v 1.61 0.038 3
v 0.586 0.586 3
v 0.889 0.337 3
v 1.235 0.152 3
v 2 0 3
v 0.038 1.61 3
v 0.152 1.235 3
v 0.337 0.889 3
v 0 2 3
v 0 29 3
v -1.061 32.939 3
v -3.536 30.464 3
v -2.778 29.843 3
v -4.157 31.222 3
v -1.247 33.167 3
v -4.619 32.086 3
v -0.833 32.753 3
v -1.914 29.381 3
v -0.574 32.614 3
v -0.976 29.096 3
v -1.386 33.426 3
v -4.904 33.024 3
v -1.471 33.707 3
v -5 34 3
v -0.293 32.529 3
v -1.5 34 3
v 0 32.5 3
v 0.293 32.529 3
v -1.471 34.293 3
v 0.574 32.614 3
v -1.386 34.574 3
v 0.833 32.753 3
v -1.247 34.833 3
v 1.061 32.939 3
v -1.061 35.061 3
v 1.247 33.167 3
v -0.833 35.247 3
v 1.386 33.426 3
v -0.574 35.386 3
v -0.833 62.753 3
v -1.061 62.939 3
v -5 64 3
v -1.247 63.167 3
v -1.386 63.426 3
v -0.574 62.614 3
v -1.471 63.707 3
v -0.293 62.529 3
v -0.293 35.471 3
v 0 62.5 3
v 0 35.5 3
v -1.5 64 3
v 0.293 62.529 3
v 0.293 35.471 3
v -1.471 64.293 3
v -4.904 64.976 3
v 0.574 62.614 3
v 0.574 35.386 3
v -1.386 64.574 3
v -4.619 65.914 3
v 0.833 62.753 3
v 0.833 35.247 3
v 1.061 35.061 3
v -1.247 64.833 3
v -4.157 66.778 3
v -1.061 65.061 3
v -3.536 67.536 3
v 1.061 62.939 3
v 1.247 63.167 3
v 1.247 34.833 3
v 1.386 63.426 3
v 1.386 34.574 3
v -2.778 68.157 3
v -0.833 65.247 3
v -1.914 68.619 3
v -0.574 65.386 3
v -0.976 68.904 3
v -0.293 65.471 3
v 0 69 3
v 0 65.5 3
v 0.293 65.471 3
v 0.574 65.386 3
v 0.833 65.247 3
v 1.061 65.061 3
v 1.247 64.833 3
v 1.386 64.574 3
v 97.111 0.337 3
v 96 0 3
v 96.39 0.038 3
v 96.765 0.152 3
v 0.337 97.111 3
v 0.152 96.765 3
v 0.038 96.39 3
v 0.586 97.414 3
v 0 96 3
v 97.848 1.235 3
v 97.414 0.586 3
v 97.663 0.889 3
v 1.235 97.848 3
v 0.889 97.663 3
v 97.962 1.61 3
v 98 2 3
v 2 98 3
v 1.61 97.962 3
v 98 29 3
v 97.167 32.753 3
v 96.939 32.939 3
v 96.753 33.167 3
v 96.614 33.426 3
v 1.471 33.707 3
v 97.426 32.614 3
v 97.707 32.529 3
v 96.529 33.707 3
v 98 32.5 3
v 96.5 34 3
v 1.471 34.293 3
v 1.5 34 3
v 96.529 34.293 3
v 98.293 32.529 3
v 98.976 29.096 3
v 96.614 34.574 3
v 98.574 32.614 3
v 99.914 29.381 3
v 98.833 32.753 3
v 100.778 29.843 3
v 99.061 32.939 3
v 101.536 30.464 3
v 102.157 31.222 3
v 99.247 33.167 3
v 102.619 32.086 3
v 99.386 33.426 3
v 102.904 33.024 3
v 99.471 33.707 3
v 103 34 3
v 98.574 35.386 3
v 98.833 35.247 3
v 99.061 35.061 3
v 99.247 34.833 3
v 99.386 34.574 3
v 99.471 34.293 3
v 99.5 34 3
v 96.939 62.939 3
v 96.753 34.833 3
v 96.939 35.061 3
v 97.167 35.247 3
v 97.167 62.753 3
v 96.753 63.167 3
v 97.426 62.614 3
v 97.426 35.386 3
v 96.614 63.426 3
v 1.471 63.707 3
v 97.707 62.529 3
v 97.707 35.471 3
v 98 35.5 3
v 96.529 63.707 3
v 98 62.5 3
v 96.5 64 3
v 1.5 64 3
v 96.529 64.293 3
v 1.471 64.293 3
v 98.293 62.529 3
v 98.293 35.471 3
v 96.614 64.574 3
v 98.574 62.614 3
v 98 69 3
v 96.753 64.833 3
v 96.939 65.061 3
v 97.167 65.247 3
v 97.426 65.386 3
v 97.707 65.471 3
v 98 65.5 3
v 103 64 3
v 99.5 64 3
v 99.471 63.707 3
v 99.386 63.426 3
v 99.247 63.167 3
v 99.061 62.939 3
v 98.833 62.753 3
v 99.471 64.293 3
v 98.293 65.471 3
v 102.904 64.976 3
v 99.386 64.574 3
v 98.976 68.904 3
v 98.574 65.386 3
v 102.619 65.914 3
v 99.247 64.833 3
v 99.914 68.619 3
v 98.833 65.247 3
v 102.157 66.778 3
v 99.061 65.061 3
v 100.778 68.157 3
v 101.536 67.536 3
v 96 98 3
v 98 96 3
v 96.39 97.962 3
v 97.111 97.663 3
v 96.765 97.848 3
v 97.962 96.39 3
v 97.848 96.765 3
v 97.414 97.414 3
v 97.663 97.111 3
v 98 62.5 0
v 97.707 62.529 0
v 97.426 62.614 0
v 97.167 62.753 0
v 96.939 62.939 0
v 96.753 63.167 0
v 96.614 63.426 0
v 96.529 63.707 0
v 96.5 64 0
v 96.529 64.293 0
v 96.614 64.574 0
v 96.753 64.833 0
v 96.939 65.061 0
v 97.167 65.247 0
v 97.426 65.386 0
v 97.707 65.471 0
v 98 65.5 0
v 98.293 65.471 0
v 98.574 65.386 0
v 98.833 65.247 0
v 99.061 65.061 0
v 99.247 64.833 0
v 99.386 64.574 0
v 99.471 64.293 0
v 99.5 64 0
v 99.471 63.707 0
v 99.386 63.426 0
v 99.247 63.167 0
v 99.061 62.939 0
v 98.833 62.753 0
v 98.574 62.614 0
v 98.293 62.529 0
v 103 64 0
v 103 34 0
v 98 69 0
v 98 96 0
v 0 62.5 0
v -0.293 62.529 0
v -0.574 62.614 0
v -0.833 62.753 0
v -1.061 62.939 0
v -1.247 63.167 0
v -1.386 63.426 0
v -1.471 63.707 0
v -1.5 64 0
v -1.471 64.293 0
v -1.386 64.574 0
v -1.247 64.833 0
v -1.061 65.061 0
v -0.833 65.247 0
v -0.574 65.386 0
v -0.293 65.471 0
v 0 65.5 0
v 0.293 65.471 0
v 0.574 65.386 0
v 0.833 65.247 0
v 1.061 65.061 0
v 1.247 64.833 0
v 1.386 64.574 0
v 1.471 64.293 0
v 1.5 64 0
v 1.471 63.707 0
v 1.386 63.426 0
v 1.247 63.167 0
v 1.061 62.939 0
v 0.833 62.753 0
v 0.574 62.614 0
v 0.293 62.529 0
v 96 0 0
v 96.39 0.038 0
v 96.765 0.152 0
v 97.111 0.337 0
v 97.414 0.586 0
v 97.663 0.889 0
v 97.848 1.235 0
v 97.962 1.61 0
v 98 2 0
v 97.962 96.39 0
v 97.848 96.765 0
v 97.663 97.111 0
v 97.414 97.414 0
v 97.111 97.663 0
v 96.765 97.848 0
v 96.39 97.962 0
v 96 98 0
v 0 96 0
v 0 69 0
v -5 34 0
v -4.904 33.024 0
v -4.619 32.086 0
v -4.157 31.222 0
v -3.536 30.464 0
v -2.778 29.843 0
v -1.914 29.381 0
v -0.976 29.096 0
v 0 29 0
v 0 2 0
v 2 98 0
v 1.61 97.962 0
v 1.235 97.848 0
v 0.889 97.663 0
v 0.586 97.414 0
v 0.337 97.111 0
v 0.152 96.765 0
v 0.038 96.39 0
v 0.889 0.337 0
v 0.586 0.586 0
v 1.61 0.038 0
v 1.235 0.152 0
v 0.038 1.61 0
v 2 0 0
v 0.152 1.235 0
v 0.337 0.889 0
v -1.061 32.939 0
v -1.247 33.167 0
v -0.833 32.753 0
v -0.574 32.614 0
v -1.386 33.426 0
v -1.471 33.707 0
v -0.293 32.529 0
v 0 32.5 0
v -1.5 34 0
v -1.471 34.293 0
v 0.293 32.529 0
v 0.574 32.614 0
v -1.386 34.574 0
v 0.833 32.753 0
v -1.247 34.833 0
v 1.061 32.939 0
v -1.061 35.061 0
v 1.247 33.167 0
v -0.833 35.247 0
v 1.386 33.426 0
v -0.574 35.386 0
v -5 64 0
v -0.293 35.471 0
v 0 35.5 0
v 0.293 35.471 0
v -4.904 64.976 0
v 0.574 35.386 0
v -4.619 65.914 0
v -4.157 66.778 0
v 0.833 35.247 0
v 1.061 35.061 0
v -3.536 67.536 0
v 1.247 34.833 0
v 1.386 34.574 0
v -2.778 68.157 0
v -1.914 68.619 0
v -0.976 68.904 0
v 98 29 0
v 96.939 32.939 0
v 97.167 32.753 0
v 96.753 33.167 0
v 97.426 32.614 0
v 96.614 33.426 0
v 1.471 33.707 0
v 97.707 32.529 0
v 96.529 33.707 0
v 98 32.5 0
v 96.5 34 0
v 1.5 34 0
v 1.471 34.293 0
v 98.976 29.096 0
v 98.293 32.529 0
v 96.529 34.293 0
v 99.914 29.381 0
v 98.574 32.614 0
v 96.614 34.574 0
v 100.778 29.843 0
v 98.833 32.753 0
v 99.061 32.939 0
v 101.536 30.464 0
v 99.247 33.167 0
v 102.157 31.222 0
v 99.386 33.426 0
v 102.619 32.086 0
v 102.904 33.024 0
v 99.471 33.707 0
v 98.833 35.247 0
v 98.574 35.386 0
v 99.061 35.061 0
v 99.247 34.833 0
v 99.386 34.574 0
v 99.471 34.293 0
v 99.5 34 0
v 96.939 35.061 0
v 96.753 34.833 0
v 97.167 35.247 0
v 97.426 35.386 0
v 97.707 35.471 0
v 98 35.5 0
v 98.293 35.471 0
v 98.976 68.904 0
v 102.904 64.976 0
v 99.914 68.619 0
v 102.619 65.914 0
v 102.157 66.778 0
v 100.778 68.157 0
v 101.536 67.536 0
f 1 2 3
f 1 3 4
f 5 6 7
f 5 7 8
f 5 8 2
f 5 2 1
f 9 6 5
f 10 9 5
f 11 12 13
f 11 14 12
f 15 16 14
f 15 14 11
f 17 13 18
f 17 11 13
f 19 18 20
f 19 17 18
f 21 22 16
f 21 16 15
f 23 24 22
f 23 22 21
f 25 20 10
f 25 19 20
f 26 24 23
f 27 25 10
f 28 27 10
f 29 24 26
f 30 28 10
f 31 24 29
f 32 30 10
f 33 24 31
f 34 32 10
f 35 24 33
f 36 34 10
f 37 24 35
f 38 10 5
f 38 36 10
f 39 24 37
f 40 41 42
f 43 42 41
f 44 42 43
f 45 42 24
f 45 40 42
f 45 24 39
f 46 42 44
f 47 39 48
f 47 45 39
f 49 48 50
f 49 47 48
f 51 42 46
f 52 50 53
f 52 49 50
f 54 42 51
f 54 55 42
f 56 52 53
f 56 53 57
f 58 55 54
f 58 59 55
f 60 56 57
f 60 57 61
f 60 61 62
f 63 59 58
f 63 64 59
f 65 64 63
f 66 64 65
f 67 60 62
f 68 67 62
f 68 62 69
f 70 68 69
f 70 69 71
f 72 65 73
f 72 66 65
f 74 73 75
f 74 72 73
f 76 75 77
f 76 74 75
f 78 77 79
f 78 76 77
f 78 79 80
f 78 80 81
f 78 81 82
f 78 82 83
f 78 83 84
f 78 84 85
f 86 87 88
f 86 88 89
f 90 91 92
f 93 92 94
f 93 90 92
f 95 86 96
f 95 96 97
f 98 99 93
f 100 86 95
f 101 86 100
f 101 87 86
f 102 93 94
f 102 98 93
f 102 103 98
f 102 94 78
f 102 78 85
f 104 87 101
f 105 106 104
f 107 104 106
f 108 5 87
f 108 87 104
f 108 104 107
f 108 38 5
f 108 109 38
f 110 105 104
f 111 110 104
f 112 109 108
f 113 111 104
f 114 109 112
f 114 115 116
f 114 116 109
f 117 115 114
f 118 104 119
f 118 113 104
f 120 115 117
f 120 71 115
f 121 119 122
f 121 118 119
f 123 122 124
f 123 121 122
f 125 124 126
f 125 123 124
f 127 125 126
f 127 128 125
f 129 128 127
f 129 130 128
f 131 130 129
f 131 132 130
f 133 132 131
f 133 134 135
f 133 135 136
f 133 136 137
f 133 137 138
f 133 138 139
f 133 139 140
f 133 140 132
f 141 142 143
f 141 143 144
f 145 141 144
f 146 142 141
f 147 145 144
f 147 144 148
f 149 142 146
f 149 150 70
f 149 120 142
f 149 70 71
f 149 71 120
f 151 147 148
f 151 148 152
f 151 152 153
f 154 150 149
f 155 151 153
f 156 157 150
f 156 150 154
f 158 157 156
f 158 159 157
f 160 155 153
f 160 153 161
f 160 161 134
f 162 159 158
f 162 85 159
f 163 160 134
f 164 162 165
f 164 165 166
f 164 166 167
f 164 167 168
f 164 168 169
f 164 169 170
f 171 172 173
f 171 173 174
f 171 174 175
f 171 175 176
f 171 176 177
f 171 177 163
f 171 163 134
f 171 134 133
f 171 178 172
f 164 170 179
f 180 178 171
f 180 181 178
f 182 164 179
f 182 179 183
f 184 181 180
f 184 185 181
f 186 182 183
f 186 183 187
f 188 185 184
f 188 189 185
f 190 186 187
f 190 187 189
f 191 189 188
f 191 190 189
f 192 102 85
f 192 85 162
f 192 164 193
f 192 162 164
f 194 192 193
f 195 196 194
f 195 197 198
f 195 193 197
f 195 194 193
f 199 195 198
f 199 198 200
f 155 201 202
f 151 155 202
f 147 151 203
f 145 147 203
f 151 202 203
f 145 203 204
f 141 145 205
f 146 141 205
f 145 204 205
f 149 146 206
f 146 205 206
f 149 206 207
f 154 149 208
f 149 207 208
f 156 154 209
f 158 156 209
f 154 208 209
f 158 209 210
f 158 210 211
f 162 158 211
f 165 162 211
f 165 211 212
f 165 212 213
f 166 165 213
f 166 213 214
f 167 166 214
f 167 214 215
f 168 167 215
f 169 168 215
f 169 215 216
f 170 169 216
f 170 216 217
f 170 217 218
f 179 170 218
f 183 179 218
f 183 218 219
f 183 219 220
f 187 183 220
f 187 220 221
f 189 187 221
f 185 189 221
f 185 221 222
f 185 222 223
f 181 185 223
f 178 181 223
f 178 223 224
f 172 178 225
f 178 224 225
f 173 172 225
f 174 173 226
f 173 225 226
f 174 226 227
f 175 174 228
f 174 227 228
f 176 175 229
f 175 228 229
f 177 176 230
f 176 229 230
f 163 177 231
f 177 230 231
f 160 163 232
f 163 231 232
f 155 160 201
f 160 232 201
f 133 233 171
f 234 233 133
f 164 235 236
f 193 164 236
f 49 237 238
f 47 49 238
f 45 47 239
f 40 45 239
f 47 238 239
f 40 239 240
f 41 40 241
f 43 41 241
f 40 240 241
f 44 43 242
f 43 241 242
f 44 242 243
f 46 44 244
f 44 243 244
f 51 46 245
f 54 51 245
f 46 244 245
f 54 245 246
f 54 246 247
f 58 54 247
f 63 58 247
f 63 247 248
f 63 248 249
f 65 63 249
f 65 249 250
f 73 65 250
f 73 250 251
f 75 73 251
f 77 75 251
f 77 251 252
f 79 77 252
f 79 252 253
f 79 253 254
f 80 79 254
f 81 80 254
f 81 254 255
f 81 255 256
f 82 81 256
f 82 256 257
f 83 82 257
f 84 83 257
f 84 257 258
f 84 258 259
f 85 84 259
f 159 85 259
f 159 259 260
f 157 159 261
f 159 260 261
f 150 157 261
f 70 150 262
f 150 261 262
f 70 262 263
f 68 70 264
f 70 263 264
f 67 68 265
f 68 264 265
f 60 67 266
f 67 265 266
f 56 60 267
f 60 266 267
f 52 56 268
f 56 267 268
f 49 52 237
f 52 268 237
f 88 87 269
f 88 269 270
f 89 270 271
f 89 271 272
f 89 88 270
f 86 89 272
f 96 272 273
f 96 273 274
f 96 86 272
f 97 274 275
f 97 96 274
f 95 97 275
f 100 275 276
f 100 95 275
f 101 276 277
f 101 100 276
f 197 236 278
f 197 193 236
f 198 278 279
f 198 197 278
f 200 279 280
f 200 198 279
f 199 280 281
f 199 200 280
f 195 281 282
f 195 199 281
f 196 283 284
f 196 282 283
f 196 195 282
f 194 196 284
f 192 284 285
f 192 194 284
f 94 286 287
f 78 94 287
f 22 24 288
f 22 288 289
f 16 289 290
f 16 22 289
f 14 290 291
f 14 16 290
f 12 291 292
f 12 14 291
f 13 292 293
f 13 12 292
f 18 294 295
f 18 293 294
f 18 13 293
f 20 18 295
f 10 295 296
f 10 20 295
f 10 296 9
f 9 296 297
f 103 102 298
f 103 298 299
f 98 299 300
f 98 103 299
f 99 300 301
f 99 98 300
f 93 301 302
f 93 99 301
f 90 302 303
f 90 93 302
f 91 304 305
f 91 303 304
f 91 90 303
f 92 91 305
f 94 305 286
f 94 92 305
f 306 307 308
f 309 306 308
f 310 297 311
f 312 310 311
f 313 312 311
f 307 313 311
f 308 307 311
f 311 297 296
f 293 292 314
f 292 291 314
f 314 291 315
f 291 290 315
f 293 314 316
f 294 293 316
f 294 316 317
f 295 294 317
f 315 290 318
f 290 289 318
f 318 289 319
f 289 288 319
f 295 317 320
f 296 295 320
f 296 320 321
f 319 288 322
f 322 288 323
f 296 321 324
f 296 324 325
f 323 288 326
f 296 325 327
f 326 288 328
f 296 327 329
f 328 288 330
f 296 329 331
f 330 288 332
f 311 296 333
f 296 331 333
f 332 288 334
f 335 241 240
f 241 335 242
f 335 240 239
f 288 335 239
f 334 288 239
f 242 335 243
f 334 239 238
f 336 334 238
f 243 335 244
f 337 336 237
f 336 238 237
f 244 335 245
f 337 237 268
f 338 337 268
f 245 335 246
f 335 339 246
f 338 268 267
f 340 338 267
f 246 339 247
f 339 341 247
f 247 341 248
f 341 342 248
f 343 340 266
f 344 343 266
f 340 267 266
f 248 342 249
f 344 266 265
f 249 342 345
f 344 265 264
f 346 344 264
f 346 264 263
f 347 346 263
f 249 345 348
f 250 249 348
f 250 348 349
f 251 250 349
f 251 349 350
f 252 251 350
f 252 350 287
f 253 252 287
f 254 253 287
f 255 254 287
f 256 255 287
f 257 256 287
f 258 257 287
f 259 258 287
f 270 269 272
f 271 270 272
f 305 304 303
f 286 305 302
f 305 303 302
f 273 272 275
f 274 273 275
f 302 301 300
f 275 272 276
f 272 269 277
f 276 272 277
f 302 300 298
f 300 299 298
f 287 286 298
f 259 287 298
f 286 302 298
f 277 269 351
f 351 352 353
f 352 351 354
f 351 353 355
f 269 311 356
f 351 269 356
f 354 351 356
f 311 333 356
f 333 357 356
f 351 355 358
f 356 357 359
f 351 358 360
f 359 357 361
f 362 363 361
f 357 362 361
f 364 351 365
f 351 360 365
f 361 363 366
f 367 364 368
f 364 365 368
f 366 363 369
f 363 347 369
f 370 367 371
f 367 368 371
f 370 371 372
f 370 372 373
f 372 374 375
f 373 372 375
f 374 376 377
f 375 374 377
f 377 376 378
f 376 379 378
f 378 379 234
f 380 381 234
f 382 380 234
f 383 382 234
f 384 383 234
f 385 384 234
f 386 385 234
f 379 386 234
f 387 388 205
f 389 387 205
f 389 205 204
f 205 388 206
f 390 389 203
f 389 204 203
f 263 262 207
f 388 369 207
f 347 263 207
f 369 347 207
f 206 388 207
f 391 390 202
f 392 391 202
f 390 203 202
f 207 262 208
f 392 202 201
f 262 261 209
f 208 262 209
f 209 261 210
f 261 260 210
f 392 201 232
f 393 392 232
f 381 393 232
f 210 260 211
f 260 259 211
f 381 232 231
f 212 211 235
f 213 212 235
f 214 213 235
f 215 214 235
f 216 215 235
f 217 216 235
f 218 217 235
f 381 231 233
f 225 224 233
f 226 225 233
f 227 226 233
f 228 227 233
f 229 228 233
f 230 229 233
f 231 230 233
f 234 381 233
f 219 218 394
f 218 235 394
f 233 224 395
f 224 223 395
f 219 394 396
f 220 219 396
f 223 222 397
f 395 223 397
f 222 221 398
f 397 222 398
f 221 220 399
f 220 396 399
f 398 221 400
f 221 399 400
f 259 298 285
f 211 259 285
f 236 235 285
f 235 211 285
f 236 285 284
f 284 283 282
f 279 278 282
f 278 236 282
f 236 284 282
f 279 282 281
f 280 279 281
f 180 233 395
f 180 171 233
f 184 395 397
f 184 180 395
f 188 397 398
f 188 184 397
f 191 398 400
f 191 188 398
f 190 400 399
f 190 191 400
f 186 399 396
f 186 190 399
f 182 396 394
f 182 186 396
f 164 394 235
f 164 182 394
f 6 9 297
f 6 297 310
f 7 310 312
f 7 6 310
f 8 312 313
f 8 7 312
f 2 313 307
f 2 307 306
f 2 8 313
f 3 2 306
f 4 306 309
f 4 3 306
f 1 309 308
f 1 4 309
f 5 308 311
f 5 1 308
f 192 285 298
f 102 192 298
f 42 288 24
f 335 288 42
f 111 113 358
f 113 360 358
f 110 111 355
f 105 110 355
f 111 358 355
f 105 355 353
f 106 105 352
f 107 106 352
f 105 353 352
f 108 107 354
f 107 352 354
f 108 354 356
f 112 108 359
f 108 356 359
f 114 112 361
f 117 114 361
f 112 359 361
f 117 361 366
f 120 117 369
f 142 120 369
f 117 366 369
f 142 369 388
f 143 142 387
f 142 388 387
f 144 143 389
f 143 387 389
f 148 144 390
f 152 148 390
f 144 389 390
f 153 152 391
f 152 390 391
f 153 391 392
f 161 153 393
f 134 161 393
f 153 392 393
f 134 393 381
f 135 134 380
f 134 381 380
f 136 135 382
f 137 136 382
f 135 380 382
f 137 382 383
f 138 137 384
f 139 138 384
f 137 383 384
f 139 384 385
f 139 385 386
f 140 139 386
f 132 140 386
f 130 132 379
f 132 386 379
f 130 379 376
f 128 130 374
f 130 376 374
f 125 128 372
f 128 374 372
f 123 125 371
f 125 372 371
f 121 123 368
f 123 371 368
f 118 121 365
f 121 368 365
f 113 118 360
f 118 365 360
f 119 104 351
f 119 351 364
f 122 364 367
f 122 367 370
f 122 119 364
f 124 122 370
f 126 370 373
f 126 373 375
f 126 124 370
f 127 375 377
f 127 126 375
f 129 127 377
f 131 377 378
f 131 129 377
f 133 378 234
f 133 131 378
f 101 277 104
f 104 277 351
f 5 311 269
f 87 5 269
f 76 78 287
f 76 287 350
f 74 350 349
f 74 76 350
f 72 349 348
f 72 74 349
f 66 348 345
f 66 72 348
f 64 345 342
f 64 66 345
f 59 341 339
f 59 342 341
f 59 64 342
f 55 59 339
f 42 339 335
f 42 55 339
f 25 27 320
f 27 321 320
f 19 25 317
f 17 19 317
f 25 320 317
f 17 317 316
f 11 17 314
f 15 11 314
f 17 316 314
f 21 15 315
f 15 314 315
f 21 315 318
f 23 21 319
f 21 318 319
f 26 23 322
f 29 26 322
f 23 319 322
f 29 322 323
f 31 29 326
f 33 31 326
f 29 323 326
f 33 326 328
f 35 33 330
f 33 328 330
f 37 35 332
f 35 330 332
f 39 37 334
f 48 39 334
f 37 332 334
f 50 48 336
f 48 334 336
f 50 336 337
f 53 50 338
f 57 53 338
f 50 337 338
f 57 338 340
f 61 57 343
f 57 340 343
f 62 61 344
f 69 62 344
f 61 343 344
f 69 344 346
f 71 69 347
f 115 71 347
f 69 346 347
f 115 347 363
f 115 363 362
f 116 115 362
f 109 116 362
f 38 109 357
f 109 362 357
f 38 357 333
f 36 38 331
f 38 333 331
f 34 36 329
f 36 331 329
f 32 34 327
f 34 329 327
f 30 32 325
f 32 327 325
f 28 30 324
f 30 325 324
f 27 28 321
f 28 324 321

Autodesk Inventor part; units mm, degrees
ref_plane "YZ Plane" through (0, 0, 0) normal (1, 0, 0) x (0, 1, 0)
ref_plane "XZ Plane" through (0, 0, 0) normal (0, 1, 0) x (-1, 0, 0)
ref_plane "XY Plane" through (0, 0, 0) normal (0, 0, 1) x (1, 0, 0)
sketch "Sketch1" plane through (0, 0, 0) normal (0, 0, 1) x (1, 0, 0)
  line L0 (0, 0) -> (98, 0)
  line L1 (98, 0) -> (98, 98)
  line L2 (98, 98) -> (0, 98)
  line L3 (0, 98) -> (0, 0)
  line L4 (-5, 69) -> (103, 69)
  line L5 (103, 69) -> (103, 29)
  line L6 (103, 29) -> (-5, 29)
  line L7 (-5, 29) -> (-5, 69)
  dimension "d0" = 98
  dimension "d1" = 98
  dimension "d14" = 108
  dimension "d15" = 40
  dimension "d16" = 5
  dimension "d17" = 29
extrude "Extrusion1" add sketch "Sketch1" along normal blind 3
fillet "Fillet3" radius 2 4 edges at (0, 0, 1.5) (98, 0, 1.5) (0, 98, 1.5) (98, 98, 1.5)
fillet "Fillet9" radius 5 4 edges at (-5, 29, 1.5) (-5, 69, 1.5) (103, 29, 1.5) (103, 69, 1.5)
sketch "Sketch8" plane through (0, 0, 3) normal (0, 0, 1) x (1, 0, 0)
  arc A0 (0, 69) -> (-5, 64) centre (0, 64) ccw projected
  arc A1 (-5, 34) -> (0, 29) centre (0, 34) ccw projected
  arc A2 (98, 29) -> (103, 34) centre (98, 34) ccw projected
  arc A3 (103, 64) -> (98, 69) centre (98, 64) ccw projected
hole "Hole5" at (0, 34, 3) at (0, 64, 3) at (98, 34, 3) at (98, 64, 3) direction (0, 0, -1) diameter 3 end through all
properties part number "plastic_part_11"
